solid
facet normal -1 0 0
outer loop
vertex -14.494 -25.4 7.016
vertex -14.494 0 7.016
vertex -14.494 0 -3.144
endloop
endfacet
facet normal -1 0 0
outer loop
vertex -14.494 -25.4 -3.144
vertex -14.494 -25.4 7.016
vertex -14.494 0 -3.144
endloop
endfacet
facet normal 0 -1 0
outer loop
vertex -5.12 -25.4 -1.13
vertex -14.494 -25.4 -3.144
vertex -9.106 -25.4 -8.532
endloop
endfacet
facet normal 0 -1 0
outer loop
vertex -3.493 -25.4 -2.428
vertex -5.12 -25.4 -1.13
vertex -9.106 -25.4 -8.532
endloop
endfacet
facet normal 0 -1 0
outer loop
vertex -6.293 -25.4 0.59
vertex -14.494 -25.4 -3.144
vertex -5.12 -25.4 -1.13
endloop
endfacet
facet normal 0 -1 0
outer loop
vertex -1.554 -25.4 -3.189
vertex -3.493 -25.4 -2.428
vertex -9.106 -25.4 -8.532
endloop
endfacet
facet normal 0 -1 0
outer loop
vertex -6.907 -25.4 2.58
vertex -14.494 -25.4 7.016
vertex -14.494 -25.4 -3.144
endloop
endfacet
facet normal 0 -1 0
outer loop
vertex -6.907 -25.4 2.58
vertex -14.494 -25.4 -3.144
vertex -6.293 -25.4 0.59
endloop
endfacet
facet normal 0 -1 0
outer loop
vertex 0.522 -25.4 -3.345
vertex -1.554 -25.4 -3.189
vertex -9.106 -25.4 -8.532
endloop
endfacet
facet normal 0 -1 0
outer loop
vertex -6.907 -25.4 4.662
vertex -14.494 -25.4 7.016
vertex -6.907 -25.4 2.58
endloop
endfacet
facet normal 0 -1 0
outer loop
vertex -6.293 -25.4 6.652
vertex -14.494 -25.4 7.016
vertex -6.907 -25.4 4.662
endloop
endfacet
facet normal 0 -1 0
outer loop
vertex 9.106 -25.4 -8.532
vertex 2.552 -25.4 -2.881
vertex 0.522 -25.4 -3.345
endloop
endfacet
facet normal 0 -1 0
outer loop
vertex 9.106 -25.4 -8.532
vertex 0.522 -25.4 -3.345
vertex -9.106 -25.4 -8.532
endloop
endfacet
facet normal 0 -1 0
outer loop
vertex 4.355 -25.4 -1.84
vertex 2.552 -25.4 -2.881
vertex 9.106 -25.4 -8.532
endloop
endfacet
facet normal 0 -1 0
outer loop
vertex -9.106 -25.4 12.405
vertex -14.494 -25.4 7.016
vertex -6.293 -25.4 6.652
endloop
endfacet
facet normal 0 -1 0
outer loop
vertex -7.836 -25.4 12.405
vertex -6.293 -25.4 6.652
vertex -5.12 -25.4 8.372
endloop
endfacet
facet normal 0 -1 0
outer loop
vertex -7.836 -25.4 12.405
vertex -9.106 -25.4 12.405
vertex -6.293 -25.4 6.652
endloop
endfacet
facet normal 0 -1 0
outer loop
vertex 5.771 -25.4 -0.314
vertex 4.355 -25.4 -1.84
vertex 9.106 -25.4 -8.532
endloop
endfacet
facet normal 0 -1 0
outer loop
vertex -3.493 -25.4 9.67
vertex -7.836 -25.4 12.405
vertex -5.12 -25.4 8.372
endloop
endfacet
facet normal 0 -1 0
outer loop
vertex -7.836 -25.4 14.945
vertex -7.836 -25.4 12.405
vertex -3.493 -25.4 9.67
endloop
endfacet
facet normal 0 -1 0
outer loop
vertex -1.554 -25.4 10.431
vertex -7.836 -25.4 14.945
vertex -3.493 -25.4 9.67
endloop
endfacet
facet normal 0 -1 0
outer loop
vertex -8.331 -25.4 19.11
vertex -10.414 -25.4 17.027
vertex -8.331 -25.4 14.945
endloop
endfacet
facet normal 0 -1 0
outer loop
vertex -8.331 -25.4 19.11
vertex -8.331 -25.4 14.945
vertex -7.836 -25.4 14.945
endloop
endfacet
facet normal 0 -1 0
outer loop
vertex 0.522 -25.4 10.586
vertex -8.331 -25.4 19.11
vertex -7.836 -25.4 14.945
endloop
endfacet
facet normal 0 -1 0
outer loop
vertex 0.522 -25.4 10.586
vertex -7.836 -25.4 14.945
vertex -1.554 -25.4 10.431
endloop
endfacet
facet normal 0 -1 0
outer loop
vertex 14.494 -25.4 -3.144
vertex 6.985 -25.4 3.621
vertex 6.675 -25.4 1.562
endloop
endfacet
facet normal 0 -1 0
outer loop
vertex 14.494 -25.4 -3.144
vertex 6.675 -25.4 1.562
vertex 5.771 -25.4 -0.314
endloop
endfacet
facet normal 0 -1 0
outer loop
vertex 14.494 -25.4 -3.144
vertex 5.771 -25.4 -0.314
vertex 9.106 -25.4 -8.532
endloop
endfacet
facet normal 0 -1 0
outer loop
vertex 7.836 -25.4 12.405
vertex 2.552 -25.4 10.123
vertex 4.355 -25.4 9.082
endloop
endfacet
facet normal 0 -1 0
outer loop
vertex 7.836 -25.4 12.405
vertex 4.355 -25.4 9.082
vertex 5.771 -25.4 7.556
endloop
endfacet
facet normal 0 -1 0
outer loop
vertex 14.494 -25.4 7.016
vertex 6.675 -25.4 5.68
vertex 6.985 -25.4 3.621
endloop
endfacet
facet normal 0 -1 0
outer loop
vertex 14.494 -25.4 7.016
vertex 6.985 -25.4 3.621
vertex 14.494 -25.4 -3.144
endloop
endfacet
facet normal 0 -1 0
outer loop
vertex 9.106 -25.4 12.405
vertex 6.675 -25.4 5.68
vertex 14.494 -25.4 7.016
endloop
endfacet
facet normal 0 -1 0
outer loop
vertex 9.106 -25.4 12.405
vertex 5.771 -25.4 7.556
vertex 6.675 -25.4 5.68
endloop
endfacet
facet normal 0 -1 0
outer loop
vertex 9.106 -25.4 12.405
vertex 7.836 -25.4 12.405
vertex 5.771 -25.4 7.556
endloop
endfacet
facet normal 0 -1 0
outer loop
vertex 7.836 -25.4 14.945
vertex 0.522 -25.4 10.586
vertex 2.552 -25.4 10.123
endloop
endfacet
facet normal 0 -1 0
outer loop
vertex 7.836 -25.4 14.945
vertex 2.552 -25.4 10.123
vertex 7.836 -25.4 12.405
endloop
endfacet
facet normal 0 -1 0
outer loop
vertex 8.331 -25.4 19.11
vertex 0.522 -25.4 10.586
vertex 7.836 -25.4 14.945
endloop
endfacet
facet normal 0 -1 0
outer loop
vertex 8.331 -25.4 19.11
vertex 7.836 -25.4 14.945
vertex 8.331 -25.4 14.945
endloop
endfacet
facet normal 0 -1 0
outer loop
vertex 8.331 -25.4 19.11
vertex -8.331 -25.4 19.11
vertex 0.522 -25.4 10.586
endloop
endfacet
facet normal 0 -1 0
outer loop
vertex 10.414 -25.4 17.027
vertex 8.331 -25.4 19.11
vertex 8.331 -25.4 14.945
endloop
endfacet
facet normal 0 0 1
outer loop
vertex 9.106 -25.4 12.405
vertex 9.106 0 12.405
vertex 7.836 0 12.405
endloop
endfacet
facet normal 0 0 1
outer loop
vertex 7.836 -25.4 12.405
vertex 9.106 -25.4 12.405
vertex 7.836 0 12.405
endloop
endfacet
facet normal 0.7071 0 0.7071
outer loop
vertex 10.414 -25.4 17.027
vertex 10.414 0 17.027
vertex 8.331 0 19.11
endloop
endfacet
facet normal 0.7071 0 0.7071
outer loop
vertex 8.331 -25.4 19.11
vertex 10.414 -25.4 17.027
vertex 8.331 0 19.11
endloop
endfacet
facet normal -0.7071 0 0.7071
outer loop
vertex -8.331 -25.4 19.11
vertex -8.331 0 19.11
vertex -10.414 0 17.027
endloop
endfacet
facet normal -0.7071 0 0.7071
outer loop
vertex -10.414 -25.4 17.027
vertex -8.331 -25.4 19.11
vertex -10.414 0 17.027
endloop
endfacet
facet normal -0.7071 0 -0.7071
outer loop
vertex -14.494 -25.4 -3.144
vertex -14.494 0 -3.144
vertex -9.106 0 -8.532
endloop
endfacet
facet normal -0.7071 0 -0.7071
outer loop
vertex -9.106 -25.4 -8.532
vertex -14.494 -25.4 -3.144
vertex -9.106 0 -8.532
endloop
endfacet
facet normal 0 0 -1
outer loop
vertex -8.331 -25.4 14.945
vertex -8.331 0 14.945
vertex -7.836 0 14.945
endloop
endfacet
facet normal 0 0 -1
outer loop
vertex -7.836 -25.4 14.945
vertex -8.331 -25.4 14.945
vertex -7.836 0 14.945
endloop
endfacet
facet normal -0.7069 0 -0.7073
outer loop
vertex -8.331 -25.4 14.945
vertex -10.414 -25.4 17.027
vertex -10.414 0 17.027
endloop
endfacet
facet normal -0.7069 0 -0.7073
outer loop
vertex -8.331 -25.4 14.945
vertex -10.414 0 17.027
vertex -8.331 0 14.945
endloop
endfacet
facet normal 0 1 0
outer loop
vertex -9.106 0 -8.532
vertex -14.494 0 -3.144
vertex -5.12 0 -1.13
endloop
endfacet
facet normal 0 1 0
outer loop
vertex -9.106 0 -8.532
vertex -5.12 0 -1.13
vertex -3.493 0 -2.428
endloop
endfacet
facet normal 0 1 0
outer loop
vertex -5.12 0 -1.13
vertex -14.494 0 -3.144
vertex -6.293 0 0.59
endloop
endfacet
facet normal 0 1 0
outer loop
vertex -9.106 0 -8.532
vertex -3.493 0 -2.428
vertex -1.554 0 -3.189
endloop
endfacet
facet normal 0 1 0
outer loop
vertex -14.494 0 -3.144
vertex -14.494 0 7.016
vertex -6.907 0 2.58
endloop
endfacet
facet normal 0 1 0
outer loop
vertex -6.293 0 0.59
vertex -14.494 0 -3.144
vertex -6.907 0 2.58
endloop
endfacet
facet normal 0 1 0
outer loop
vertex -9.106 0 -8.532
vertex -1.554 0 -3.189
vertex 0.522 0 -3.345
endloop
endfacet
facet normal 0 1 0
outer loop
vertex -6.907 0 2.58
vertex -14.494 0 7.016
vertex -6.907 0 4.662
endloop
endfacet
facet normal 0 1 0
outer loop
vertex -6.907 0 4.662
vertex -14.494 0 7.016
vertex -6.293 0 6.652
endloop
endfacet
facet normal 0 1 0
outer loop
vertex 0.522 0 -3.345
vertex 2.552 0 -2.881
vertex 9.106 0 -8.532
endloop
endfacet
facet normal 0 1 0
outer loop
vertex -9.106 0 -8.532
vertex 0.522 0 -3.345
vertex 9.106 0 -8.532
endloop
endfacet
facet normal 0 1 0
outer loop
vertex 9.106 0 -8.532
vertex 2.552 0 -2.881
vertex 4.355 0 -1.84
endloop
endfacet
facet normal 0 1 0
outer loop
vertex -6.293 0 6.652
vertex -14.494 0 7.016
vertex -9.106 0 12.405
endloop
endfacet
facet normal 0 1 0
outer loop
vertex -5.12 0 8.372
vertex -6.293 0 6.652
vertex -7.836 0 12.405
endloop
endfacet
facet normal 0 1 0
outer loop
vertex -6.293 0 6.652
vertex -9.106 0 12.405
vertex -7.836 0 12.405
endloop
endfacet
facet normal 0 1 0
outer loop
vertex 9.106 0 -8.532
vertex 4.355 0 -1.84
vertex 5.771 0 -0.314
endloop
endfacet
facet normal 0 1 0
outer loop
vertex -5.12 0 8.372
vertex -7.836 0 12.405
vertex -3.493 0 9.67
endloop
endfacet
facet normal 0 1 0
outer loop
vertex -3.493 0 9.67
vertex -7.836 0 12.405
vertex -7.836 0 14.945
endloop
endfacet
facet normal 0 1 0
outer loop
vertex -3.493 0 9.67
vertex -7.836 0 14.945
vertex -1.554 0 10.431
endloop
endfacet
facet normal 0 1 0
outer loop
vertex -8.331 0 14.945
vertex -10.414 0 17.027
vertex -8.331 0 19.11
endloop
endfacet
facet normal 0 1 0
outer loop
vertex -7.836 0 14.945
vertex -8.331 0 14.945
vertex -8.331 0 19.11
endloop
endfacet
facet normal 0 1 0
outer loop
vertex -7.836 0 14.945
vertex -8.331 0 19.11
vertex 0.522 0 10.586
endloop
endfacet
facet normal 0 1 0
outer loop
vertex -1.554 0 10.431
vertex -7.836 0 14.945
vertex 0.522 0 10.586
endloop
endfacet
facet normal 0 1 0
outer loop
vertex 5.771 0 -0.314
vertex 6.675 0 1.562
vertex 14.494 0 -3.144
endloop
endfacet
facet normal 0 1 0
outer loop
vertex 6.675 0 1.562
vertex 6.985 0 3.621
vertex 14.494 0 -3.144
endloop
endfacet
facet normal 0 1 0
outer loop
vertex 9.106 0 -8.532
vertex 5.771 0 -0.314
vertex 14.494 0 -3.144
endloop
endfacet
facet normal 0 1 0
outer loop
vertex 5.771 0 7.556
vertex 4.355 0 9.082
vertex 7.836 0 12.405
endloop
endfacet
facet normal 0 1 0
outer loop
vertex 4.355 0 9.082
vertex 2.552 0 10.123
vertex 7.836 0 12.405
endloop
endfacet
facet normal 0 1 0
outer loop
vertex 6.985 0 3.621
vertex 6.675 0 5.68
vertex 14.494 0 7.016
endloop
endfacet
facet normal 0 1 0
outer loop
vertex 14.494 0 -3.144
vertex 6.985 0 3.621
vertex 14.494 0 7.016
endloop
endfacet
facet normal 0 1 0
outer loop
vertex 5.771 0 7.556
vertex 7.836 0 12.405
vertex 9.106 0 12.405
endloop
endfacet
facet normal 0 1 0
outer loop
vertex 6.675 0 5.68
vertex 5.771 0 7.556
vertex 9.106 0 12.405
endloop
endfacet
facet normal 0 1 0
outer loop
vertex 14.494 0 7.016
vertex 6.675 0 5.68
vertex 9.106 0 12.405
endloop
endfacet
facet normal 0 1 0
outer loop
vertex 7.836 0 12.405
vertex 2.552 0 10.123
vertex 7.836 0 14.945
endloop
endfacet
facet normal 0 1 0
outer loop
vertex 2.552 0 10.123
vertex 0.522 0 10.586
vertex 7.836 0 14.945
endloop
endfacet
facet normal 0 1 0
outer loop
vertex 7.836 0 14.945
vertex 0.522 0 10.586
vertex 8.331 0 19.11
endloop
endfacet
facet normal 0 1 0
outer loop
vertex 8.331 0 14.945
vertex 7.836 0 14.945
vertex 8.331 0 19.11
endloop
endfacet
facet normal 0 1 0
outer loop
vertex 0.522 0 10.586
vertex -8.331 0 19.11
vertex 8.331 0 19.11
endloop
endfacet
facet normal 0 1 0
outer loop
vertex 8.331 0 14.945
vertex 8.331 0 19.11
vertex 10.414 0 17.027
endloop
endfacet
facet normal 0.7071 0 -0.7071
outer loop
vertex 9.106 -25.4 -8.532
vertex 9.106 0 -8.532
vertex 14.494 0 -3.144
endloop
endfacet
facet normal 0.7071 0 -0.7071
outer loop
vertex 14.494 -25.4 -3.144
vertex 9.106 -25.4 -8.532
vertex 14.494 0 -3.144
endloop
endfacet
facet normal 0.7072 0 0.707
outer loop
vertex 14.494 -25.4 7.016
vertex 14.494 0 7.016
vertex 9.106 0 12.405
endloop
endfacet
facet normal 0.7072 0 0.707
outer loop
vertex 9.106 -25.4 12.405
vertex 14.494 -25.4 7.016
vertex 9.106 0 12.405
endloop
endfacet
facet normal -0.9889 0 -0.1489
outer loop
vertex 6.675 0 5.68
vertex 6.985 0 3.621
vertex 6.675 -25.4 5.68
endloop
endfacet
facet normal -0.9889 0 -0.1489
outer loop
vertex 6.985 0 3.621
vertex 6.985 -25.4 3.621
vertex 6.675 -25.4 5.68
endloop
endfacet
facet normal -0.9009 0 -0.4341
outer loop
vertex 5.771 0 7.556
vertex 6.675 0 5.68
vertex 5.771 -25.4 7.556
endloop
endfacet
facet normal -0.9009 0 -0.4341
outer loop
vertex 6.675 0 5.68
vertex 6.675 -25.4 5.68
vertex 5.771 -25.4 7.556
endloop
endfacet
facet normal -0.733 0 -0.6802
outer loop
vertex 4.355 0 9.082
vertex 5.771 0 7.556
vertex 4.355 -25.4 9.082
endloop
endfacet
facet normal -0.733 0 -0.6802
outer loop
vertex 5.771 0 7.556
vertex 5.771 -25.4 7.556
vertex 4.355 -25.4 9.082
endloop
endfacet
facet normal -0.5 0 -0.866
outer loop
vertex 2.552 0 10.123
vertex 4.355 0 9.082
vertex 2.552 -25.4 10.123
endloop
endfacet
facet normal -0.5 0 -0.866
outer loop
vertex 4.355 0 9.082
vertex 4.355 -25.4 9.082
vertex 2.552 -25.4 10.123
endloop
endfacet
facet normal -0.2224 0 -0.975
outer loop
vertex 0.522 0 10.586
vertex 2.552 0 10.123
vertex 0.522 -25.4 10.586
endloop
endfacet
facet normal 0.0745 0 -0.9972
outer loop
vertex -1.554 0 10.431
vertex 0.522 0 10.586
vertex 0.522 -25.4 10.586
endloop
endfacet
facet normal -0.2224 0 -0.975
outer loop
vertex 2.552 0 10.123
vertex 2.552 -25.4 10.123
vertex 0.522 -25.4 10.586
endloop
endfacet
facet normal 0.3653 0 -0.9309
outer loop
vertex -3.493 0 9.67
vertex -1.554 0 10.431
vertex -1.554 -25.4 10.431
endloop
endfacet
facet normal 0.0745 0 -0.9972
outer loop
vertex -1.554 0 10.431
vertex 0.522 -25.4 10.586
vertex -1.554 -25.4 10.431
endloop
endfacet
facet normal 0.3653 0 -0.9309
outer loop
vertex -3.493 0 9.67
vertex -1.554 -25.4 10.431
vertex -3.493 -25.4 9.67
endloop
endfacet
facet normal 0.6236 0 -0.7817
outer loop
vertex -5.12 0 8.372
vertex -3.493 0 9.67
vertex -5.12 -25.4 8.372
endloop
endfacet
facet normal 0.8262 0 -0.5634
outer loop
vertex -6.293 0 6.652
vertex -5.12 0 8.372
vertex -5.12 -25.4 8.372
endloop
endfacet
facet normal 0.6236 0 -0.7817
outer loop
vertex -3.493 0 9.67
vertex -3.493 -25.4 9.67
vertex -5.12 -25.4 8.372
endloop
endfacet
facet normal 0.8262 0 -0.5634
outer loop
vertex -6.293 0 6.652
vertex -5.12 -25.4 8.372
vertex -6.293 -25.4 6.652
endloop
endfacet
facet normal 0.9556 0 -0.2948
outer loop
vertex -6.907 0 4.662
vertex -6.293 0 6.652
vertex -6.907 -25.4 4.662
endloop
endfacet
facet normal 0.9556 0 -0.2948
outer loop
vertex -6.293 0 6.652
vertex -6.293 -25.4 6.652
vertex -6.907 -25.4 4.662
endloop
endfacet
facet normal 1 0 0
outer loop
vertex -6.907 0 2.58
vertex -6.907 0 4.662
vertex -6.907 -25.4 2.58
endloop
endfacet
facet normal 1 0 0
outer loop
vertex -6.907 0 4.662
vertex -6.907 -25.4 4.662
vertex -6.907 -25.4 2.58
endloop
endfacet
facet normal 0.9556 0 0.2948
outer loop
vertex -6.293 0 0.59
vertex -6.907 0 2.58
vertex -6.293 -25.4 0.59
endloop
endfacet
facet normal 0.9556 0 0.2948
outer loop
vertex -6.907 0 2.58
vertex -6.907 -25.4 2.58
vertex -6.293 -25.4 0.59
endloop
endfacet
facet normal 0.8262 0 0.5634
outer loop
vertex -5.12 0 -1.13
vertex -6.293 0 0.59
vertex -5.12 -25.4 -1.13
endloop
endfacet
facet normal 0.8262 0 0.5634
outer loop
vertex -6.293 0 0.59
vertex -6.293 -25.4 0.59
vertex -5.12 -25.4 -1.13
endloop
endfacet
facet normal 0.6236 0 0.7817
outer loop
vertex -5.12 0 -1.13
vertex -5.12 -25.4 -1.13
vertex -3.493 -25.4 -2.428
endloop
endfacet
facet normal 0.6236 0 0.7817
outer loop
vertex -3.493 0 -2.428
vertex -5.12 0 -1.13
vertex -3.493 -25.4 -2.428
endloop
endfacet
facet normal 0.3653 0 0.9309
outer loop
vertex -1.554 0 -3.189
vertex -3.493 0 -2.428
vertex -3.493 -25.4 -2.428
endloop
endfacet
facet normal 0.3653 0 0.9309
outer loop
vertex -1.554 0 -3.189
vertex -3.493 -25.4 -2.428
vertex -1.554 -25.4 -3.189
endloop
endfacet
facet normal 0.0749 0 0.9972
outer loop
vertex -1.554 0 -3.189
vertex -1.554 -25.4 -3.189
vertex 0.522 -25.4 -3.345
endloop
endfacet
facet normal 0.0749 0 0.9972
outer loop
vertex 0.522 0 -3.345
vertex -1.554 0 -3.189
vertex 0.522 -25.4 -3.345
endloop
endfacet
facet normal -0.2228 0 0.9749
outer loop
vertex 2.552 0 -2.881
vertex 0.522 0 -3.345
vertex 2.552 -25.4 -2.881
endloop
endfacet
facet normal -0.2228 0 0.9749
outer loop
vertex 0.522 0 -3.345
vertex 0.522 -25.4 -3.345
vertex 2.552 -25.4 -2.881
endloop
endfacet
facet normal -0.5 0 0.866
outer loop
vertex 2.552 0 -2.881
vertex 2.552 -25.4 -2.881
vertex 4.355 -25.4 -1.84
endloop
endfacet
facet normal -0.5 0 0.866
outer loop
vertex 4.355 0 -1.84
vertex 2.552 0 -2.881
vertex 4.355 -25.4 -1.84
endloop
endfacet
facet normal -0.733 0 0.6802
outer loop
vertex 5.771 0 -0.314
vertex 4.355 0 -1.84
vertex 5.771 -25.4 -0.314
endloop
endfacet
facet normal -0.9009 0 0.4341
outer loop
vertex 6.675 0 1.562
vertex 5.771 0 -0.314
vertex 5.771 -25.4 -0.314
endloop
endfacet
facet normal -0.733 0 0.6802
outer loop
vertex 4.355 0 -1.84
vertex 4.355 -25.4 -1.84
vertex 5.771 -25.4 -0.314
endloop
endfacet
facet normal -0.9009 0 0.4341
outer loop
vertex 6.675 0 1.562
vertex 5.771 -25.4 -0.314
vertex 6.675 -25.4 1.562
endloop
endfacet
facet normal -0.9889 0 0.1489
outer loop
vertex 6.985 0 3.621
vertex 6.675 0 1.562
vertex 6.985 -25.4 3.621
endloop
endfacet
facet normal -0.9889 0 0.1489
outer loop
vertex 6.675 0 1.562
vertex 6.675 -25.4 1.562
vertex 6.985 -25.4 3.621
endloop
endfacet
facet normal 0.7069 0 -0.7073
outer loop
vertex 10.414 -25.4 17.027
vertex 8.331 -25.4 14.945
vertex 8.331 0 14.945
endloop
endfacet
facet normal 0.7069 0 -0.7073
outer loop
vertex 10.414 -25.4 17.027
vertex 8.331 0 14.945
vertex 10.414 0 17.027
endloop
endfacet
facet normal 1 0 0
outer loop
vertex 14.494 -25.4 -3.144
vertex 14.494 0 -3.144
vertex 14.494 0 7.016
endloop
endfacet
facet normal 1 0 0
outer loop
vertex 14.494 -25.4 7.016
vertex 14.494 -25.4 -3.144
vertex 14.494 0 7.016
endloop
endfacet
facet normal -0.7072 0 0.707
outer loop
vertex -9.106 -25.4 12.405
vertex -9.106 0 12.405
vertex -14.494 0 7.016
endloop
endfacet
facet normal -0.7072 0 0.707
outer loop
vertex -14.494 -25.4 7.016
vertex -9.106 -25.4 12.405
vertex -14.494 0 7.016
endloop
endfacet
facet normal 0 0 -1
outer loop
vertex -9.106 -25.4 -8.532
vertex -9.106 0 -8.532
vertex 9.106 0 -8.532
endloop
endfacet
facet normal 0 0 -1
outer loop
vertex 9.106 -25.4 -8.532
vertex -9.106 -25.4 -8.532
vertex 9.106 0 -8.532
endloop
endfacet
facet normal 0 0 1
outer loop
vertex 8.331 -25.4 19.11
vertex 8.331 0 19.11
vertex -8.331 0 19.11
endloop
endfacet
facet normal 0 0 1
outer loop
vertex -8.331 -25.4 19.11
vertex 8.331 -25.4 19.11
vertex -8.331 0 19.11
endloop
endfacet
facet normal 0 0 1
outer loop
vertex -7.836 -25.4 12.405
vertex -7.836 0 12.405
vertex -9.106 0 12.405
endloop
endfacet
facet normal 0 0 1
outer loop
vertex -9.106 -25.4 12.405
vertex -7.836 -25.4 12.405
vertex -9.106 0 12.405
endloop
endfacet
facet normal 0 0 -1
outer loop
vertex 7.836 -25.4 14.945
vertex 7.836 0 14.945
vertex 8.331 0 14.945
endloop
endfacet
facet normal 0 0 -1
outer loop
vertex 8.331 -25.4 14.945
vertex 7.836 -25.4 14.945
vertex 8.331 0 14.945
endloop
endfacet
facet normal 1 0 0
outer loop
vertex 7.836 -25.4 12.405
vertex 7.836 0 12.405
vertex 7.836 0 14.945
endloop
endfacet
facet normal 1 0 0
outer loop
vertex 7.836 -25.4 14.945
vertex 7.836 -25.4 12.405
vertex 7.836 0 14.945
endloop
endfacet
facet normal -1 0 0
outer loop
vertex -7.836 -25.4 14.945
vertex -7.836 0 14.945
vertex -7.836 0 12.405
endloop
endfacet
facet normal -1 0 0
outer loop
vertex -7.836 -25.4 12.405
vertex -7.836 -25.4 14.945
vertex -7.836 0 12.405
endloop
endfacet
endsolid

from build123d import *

# Parameters (mm, degrees)
F1_DEPTH    = 25.4
F3_D        = 13.97
F3_DEPTH    = 25.4
F3_TIP      = 4.1970114239
F4_T1_DEPTH = 37.157734621


# Not quite as in the source:
# - a fillet or chamfer that OpenCascade refuses, or shapes differently, is made with other operations: its cross-section is extruded or revolved along the edge and cut away or added


with BuildPart() as f1:
    # F0 (on Front) → F1 (new body)
    with BuildSketch(Plane.XZ):
        Polygon((10.6172, 19.1102290041), (0, 19.1102290041), (0, -8.5316783412), (9.1059, -8.5316783412), (14.4940536726, -3.1435246685), (14.4940536726, 7.0164753315), (9.1059, 12.4046290041), (7.8359, 12.4046290041), (7.8359, 14.9446290041), (10.6172, 14.9446290041), align=None)
        Polygon((0, -8.5316783412), (0, 19.1102290041), (-10.6172, 19.1102290041), (-10.6172, 14.9446290041), (-7.8359, 14.9446290041), (-7.8359, 12.4046290041), (-9.1059, 12.4046290041), (-14.4940536726, 7.0164753315), (-14.4940536726, -3.1435246685), (-9.1059, -8.5316783412), align=None)
    extrude(amount=F1_DEPTH)

    # F3
    with Locations(Plane(origin=(0, 0, 0), x_dir=(-1, 0, 0), z_dir=(0, 1, 0))):
        with Locations((0, 3.620829666)):
            Hole(F3_D / 2, depth=F3_DEPTH)
            with Locations((0, 0, -(F3_DEPTH + F3_TIP / 2))):  # 118° drill point
                Cone(0, F3_D / 2, F3_TIP, mode=Mode.SUBTRACT)

    # F4: chamfer of 2.286 on 4 edges, made by hand

    # F4_s2 → F4_t1 (cut)
    with BuildSketch(Plane.XZ.offset(-5.8788673105)):
        Polygon((8.3312, 14.9446290041), (10.6172, 17.2306290041), (10.6172, 14.9446290041), align=None)
        Polygon((10.6172, 16.8242290041), (8.3312, 19.1102290041), (10.6172, 19.1102290041), align=None)
        Polygon((-8.3312, 19.1102290041), (-10.6172, 16.8242290041), (-10.6172, 19.1102290041), align=None)
        Polygon((-10.6172, 17.2306290041), (-8.3312, 14.9446290041), (-10.6172, 14.9446290041), align=None)
    extrude(amount=F4_T1_DEPTH, mode=Mode.SUBTRACT)


solid = f1.part
